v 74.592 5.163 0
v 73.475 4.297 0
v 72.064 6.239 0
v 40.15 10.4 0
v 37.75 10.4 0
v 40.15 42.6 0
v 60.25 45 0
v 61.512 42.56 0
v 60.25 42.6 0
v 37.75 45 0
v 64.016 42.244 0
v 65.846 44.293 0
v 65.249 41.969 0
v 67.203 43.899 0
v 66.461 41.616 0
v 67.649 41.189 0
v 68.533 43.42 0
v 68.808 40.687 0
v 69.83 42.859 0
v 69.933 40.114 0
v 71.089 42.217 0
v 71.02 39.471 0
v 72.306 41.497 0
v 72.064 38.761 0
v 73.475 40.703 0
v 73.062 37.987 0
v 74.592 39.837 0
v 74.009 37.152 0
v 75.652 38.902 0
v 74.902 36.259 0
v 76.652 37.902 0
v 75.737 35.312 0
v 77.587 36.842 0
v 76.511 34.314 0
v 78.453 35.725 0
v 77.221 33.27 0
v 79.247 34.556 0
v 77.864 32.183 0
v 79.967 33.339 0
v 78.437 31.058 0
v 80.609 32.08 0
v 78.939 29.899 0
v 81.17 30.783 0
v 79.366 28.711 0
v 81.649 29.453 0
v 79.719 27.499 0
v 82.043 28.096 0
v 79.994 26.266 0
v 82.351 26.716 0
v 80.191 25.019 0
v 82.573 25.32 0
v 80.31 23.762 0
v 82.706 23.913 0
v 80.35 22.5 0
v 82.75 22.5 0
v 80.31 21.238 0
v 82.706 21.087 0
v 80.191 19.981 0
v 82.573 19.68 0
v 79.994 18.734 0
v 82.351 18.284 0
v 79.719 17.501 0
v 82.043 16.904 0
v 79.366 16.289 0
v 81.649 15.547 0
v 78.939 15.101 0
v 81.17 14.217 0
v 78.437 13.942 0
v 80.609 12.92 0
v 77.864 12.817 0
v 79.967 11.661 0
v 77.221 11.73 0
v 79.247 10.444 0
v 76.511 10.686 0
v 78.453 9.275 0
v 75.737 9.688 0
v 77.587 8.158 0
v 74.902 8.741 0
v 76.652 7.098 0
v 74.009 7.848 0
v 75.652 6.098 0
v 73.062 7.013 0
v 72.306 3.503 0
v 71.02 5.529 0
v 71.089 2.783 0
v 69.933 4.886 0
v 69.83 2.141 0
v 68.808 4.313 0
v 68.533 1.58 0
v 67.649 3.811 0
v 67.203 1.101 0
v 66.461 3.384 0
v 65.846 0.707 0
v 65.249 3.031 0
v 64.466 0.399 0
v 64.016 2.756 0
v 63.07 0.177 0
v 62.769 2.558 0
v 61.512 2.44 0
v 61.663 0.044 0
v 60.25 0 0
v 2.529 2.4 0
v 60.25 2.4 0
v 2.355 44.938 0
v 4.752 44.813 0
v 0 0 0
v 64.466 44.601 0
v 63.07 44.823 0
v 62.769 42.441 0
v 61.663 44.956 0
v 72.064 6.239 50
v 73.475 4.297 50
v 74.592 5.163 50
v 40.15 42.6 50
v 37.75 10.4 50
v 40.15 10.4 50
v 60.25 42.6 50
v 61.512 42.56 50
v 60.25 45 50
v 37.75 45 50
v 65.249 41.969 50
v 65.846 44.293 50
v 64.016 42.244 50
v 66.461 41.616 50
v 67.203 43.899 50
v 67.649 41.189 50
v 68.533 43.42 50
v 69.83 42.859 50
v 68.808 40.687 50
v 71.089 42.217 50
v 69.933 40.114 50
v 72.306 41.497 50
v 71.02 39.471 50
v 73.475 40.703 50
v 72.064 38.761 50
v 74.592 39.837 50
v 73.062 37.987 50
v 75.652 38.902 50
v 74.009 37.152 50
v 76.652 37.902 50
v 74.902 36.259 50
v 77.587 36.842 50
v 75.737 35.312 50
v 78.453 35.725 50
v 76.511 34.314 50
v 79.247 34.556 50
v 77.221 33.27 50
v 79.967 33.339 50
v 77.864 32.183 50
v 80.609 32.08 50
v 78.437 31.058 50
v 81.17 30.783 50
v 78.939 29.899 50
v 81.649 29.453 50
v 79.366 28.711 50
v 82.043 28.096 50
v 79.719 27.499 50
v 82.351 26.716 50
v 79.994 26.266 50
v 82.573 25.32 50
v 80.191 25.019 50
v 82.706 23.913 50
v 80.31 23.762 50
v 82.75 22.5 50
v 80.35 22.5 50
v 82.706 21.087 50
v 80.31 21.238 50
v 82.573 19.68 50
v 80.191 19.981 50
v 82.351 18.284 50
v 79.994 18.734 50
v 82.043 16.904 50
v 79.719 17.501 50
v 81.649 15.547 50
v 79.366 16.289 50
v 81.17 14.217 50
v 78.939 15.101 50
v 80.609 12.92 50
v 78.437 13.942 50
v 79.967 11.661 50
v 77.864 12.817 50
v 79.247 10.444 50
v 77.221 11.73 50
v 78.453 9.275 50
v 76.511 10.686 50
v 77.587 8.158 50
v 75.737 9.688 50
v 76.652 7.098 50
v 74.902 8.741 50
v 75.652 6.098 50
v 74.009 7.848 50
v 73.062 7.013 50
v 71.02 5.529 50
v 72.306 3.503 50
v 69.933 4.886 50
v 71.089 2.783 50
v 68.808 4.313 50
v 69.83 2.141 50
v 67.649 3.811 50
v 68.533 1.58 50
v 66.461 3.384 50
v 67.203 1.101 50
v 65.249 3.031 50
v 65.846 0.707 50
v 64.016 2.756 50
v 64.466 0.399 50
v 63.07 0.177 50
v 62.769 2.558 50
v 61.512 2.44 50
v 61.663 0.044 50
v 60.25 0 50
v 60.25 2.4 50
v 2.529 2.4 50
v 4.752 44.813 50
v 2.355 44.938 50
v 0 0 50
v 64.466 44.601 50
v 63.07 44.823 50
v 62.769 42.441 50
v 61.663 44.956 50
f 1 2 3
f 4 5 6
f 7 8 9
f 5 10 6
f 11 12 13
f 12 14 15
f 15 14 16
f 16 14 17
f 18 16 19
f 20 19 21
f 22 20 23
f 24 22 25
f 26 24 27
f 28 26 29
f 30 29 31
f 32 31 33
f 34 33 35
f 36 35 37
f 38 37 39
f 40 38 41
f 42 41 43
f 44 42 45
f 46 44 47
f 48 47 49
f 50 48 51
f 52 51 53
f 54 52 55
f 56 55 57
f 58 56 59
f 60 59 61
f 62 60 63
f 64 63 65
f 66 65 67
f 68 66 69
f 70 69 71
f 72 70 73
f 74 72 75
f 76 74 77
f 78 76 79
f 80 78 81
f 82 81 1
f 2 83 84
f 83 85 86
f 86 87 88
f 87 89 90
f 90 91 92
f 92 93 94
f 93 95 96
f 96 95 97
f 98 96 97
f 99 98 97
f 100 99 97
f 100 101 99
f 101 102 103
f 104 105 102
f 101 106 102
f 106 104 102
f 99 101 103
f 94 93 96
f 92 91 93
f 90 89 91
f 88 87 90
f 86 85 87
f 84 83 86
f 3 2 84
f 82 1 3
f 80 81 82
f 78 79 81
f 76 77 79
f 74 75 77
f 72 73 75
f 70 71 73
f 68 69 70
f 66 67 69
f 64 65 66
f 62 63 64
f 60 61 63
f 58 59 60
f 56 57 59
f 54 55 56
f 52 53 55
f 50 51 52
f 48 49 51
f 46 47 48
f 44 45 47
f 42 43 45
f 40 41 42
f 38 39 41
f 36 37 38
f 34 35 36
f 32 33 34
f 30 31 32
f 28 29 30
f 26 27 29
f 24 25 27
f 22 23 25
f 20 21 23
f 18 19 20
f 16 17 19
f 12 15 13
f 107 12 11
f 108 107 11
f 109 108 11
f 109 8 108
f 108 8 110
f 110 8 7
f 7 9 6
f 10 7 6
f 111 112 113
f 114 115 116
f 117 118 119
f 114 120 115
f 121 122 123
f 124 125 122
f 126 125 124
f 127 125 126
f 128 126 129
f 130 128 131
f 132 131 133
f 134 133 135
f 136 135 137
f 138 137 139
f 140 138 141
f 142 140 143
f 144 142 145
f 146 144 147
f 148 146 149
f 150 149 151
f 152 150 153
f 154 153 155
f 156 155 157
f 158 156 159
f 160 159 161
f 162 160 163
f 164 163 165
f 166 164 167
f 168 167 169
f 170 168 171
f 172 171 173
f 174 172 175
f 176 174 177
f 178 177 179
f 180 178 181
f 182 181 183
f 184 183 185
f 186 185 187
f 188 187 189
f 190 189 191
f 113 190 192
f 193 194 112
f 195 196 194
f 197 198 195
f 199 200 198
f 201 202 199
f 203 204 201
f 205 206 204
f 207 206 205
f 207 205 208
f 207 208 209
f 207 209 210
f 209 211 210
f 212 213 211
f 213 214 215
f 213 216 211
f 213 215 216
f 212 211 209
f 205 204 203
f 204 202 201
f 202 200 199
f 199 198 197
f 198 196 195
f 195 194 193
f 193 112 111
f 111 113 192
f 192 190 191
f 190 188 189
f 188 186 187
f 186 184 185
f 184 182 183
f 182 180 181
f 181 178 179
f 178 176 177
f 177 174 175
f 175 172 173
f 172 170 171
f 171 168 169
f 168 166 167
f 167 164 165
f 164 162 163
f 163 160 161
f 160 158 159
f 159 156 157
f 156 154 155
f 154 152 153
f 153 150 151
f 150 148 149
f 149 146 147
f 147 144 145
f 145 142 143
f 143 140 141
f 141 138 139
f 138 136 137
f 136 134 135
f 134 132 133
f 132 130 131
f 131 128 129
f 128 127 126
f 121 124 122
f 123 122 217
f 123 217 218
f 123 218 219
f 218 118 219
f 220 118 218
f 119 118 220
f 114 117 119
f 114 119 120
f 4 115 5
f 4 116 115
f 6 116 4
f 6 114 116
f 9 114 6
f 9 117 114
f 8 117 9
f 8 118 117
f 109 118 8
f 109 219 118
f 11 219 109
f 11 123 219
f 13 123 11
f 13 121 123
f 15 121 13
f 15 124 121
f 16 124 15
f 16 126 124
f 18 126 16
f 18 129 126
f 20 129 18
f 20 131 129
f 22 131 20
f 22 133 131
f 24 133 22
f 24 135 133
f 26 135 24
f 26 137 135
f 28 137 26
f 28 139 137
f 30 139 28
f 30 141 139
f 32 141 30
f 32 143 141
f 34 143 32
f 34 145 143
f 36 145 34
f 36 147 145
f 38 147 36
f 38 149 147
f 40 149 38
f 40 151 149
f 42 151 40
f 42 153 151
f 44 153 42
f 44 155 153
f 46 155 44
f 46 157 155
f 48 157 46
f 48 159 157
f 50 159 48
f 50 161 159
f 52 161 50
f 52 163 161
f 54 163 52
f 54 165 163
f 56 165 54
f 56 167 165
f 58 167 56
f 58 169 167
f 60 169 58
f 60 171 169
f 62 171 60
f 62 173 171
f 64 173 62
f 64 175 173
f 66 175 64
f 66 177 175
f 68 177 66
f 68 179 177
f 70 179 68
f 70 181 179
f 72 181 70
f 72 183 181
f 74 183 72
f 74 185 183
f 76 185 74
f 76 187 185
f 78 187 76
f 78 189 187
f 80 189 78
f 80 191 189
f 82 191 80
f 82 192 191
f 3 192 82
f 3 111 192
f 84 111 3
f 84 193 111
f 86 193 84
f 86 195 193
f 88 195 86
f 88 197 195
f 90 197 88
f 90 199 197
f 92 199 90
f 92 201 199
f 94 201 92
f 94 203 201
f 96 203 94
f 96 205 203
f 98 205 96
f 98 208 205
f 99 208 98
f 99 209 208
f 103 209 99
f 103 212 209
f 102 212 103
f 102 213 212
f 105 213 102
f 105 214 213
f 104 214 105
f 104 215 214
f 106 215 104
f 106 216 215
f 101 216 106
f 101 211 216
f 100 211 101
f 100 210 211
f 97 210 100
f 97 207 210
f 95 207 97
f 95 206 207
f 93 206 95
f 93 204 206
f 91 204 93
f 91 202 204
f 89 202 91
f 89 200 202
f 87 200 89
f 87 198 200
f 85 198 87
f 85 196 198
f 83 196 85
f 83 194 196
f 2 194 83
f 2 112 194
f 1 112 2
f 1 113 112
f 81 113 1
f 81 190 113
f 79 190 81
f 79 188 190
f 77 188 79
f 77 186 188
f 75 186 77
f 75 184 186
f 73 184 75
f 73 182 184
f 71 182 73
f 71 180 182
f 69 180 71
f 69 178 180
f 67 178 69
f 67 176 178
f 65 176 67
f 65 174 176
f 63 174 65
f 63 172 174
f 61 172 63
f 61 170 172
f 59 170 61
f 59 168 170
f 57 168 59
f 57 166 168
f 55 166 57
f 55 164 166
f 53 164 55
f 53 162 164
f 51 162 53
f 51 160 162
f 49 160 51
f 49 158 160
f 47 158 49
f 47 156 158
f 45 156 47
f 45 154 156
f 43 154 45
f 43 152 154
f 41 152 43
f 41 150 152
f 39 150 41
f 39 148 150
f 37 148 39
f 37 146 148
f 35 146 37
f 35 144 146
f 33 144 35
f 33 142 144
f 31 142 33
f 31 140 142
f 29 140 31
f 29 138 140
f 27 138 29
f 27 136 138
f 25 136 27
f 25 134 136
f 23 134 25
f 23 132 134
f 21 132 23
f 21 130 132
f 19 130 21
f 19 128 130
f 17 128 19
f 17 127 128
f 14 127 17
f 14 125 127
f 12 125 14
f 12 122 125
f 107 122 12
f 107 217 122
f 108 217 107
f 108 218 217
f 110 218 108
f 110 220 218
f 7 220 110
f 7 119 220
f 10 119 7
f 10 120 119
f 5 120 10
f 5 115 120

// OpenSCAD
// Desk Cable Hugger v3

// Customizable desk hugger to organize cables.

// v1: https://www.thingiverse.com/thing:782152
// v2: https://www.thingiverse.com/thing:5256328

/* [Object Parameters] */
// Thickness of desktop (mm)
desk_thickness = 37.75; // [1:100]

// Gap for inserting cables (mm)
cable_gap = 8;

// Angle of the top of the clamp so that it has a better grip on the table (degrees)
clamp_angle = 3; // [0:10]

// Diameter of the bottom half circle
diameter_holder = 45;

// Width of the desk hugger (z-height)
clamp_width = 50;

// Offset added to desk_thickness
clamp_offset = 0;

/* [Printer Parameters] */
// Diameter of the printer nozzle
nozzle = 0.4;
// Number of lines to be printed
n_lines = 6;

// Derived Variables
thickness = n_lines * nozzle;
desk_width = desk_thickness - clamp_offset;

// Rename variables for brevity
w = clamp_width;
d = diameter_holder;
r = d / 2;
l = desk_width + r;
t = -clamp_angle;

module top(thickness, length, angle)
{
    rotate(a = [ 0, 0, t ])
    {
        square(size = [ thickness, d ]);
    }
}

linear_extrude(w)
{
    union()
    {
        // To remove any outcropping from rotating the top square
        // We will find the difference between the top bracket and any
        // solid NOT in both the top and the left part of the bracket
        // That is, in the corner, any solid must be part of both the top
        // and the left part of the bracket, not either individually
        // This removes material that appeares to the "left" (negative on the y-axis).
        difference()
        {
            top(thickness, d, t);
            difference()
            {
                // This x-length is deliberately thickness * 3,
                // not * 2, beacuse extreme angles can have an outcrop
                square(center = true, size = [ thickness * 3, thickness * 2 ]);
                intersection()
                {
                    top(thickness, d, t);
                    square(size = [ l, thickness ]);
                }
            }
        }
        // We apply the same logic here, but with the left square. Any material
        // not in both the top and left bracket is excluded. This removes material
        // from rotating that appears "above" (negative on the x-axis) the hook.
        difference()
        {
            square(size = [ l, thickness ]);
            difference()
            {
                square(center = true, size = [ thickness * 2, thickness * 2 ]);
                intersection()
                {
                    top(thickness, d, t);
                    square(size = [ l, thickness ]);
                }
            }
        }
        // This creates the half circle for the hook
        difference()
        {
            translate(v = [ l, r ])
            {
                circle($fn = 100, d = d);
            }
            translate(v = [ l, r ])
            {
                circle($fn = 100, d = d - (thickness * 2));
            }
            // This removes the upper half of the circle to create the semi-circle
            translate(v = [ desk_width + (r / 2), r ])
            {
                square(center = true, size = [ r, d ]);
            }
        }
        // This is the part that extends up from the semi-circle
        translate(v = [ desk_width, d - thickness ])
        {
            square(size = [ r, thickness ]);
        }
        // This is the part that goes under the desk, and is
        // the diameter of the hook minus the cable gap
        // We must offset by thickness + cable gap
        translate(v = [ desk_width, thickness + cable_gap ])
        {
            square(size = [ thickness, d - cable_gap - thickness ]);
        }
    }
}
